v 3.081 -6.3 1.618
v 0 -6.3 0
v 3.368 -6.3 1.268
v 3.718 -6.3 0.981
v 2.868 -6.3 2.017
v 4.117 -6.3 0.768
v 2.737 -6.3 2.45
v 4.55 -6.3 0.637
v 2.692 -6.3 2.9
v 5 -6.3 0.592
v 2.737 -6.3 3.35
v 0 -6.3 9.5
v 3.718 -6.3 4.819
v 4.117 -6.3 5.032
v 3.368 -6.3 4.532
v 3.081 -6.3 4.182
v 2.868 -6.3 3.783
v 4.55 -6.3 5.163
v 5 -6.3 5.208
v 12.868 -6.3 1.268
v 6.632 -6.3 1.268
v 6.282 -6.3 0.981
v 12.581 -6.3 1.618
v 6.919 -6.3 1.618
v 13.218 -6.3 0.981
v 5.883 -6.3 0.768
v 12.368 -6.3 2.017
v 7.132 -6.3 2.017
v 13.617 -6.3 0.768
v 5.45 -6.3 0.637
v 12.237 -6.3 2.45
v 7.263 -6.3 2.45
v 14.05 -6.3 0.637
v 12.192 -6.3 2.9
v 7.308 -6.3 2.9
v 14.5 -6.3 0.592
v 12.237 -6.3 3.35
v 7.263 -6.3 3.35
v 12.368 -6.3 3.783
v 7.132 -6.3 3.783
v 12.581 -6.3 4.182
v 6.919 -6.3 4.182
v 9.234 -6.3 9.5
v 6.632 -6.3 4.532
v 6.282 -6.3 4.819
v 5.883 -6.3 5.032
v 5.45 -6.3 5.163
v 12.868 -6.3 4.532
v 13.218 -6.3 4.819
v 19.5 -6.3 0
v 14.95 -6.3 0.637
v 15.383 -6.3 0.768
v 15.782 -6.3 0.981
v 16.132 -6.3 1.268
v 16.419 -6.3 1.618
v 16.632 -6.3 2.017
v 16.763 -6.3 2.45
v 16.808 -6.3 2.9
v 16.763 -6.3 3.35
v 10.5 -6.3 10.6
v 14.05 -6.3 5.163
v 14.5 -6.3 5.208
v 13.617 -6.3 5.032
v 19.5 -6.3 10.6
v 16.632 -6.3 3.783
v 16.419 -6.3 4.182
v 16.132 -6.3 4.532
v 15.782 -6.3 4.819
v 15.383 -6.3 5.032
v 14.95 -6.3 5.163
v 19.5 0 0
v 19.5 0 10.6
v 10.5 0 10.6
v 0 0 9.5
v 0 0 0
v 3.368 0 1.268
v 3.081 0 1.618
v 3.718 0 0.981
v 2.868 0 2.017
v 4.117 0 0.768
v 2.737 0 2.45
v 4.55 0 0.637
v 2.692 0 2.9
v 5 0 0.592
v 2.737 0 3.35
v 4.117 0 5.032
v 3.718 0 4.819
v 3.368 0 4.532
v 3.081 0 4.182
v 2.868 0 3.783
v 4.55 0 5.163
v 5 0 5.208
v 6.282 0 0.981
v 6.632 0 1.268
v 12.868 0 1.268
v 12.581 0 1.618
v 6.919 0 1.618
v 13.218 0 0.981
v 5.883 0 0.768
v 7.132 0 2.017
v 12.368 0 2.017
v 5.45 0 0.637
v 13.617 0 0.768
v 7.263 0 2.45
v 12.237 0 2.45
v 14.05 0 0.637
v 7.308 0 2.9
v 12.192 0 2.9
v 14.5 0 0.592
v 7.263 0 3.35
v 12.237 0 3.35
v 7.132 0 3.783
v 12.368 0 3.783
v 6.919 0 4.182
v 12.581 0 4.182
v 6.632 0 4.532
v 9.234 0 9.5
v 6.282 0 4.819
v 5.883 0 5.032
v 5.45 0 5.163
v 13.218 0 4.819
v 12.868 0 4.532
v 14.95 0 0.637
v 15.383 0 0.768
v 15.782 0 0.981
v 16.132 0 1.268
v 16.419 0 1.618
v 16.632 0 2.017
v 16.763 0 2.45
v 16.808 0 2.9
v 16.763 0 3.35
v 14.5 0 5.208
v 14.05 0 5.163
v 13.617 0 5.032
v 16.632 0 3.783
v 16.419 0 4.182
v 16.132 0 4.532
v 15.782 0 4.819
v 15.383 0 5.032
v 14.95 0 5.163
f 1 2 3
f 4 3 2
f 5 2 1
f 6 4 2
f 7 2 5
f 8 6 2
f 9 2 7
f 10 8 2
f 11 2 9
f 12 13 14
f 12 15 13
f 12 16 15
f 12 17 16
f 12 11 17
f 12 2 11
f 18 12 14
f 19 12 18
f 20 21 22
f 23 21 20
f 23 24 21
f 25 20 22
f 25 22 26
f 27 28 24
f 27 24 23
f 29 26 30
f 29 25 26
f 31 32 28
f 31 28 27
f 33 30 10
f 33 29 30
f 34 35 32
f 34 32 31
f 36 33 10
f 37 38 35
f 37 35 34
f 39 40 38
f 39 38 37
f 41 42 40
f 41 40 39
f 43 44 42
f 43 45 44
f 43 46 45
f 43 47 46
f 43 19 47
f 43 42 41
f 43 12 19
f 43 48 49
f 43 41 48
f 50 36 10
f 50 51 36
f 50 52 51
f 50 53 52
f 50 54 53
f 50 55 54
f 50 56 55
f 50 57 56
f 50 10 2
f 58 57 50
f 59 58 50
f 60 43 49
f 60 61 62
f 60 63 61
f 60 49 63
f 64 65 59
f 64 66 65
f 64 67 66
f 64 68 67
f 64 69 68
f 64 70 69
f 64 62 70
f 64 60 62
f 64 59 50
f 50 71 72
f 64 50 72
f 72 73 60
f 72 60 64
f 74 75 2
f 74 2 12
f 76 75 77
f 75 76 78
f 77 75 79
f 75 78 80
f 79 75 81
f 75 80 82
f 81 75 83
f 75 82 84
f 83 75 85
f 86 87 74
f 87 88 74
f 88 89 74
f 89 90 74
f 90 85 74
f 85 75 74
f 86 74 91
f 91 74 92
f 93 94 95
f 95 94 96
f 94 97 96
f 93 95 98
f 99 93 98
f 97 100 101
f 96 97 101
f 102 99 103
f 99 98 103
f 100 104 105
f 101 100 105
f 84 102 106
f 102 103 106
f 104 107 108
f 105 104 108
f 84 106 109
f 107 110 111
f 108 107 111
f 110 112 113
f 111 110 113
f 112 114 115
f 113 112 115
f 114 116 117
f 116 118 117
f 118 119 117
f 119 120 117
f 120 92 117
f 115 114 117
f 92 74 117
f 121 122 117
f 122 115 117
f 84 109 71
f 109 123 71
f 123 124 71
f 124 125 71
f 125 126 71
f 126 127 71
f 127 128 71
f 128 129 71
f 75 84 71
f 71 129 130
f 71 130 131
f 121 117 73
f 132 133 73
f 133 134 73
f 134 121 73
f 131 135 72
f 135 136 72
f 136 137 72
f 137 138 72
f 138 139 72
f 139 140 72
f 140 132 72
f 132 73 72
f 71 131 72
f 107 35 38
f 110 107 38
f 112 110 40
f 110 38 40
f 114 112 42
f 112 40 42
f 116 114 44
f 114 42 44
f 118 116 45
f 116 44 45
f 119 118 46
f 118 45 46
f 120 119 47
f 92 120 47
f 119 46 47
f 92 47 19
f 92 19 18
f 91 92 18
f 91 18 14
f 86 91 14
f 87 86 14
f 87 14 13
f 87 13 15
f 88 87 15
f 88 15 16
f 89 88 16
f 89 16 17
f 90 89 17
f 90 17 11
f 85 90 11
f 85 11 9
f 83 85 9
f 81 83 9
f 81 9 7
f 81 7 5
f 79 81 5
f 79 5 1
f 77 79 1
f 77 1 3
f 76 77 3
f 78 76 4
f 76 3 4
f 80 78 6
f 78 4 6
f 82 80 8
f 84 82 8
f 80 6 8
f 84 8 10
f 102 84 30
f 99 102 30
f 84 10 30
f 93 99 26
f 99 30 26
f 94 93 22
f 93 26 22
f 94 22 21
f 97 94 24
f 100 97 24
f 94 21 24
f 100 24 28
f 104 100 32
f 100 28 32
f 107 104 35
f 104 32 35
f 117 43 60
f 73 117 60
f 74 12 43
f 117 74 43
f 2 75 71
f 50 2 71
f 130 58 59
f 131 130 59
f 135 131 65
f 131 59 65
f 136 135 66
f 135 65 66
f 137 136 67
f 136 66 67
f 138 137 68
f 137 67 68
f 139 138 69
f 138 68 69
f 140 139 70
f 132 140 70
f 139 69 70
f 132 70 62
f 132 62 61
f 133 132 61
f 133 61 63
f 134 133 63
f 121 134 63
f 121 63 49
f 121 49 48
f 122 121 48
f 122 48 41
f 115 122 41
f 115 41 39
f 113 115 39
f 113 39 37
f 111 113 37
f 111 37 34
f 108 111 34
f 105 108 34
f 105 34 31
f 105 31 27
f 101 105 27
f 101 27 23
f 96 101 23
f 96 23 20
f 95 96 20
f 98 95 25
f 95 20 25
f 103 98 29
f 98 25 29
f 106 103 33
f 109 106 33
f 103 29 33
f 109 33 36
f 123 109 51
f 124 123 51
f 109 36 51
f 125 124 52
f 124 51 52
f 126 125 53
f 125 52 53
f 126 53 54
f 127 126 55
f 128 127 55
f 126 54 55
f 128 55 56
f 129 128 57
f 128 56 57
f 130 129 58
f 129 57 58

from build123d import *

# Parameters (mm, degrees)
F0_W     = 19.5
F0_H     = 10.6
F1_DEPTH = 6.3
F2_R     = 2.307824
F3_DEPTH = 25
F5_DEPTH = 25


with BuildPart() as f1:
    # F0 (on Front) → F1 (new body)
    with BuildSketch(Plane.XZ):
        with Locations((9.75, 5.3)):
            Rectangle(F0_W, F0_H)
    extrude(amount=F1_DEPTH)

    # F2 (on face) → F3 (cut)
    with BuildSketch(Plane.XZ.offset(6.3)):
        with Locations((5, 2.9)):
            Circle(F2_R)
        with Locations((14.5, 2.9)):
            Circle(F2_R)
    extrude(amount=-F3_DEPTH, mode=Mode.SUBTRACT)

    # F4 (on face) → F5 (cut)
    with BuildSketch(Plane.XZ.offset(6.3)):
        Polygon((10.5, 10.6), (0, 10.6), (0, 9.5), (9.2344, 9.5), align=None)
    extrude(amount=-F5_DEPTH, mode=Mode.SUBTRACT)


solid = f1.part
